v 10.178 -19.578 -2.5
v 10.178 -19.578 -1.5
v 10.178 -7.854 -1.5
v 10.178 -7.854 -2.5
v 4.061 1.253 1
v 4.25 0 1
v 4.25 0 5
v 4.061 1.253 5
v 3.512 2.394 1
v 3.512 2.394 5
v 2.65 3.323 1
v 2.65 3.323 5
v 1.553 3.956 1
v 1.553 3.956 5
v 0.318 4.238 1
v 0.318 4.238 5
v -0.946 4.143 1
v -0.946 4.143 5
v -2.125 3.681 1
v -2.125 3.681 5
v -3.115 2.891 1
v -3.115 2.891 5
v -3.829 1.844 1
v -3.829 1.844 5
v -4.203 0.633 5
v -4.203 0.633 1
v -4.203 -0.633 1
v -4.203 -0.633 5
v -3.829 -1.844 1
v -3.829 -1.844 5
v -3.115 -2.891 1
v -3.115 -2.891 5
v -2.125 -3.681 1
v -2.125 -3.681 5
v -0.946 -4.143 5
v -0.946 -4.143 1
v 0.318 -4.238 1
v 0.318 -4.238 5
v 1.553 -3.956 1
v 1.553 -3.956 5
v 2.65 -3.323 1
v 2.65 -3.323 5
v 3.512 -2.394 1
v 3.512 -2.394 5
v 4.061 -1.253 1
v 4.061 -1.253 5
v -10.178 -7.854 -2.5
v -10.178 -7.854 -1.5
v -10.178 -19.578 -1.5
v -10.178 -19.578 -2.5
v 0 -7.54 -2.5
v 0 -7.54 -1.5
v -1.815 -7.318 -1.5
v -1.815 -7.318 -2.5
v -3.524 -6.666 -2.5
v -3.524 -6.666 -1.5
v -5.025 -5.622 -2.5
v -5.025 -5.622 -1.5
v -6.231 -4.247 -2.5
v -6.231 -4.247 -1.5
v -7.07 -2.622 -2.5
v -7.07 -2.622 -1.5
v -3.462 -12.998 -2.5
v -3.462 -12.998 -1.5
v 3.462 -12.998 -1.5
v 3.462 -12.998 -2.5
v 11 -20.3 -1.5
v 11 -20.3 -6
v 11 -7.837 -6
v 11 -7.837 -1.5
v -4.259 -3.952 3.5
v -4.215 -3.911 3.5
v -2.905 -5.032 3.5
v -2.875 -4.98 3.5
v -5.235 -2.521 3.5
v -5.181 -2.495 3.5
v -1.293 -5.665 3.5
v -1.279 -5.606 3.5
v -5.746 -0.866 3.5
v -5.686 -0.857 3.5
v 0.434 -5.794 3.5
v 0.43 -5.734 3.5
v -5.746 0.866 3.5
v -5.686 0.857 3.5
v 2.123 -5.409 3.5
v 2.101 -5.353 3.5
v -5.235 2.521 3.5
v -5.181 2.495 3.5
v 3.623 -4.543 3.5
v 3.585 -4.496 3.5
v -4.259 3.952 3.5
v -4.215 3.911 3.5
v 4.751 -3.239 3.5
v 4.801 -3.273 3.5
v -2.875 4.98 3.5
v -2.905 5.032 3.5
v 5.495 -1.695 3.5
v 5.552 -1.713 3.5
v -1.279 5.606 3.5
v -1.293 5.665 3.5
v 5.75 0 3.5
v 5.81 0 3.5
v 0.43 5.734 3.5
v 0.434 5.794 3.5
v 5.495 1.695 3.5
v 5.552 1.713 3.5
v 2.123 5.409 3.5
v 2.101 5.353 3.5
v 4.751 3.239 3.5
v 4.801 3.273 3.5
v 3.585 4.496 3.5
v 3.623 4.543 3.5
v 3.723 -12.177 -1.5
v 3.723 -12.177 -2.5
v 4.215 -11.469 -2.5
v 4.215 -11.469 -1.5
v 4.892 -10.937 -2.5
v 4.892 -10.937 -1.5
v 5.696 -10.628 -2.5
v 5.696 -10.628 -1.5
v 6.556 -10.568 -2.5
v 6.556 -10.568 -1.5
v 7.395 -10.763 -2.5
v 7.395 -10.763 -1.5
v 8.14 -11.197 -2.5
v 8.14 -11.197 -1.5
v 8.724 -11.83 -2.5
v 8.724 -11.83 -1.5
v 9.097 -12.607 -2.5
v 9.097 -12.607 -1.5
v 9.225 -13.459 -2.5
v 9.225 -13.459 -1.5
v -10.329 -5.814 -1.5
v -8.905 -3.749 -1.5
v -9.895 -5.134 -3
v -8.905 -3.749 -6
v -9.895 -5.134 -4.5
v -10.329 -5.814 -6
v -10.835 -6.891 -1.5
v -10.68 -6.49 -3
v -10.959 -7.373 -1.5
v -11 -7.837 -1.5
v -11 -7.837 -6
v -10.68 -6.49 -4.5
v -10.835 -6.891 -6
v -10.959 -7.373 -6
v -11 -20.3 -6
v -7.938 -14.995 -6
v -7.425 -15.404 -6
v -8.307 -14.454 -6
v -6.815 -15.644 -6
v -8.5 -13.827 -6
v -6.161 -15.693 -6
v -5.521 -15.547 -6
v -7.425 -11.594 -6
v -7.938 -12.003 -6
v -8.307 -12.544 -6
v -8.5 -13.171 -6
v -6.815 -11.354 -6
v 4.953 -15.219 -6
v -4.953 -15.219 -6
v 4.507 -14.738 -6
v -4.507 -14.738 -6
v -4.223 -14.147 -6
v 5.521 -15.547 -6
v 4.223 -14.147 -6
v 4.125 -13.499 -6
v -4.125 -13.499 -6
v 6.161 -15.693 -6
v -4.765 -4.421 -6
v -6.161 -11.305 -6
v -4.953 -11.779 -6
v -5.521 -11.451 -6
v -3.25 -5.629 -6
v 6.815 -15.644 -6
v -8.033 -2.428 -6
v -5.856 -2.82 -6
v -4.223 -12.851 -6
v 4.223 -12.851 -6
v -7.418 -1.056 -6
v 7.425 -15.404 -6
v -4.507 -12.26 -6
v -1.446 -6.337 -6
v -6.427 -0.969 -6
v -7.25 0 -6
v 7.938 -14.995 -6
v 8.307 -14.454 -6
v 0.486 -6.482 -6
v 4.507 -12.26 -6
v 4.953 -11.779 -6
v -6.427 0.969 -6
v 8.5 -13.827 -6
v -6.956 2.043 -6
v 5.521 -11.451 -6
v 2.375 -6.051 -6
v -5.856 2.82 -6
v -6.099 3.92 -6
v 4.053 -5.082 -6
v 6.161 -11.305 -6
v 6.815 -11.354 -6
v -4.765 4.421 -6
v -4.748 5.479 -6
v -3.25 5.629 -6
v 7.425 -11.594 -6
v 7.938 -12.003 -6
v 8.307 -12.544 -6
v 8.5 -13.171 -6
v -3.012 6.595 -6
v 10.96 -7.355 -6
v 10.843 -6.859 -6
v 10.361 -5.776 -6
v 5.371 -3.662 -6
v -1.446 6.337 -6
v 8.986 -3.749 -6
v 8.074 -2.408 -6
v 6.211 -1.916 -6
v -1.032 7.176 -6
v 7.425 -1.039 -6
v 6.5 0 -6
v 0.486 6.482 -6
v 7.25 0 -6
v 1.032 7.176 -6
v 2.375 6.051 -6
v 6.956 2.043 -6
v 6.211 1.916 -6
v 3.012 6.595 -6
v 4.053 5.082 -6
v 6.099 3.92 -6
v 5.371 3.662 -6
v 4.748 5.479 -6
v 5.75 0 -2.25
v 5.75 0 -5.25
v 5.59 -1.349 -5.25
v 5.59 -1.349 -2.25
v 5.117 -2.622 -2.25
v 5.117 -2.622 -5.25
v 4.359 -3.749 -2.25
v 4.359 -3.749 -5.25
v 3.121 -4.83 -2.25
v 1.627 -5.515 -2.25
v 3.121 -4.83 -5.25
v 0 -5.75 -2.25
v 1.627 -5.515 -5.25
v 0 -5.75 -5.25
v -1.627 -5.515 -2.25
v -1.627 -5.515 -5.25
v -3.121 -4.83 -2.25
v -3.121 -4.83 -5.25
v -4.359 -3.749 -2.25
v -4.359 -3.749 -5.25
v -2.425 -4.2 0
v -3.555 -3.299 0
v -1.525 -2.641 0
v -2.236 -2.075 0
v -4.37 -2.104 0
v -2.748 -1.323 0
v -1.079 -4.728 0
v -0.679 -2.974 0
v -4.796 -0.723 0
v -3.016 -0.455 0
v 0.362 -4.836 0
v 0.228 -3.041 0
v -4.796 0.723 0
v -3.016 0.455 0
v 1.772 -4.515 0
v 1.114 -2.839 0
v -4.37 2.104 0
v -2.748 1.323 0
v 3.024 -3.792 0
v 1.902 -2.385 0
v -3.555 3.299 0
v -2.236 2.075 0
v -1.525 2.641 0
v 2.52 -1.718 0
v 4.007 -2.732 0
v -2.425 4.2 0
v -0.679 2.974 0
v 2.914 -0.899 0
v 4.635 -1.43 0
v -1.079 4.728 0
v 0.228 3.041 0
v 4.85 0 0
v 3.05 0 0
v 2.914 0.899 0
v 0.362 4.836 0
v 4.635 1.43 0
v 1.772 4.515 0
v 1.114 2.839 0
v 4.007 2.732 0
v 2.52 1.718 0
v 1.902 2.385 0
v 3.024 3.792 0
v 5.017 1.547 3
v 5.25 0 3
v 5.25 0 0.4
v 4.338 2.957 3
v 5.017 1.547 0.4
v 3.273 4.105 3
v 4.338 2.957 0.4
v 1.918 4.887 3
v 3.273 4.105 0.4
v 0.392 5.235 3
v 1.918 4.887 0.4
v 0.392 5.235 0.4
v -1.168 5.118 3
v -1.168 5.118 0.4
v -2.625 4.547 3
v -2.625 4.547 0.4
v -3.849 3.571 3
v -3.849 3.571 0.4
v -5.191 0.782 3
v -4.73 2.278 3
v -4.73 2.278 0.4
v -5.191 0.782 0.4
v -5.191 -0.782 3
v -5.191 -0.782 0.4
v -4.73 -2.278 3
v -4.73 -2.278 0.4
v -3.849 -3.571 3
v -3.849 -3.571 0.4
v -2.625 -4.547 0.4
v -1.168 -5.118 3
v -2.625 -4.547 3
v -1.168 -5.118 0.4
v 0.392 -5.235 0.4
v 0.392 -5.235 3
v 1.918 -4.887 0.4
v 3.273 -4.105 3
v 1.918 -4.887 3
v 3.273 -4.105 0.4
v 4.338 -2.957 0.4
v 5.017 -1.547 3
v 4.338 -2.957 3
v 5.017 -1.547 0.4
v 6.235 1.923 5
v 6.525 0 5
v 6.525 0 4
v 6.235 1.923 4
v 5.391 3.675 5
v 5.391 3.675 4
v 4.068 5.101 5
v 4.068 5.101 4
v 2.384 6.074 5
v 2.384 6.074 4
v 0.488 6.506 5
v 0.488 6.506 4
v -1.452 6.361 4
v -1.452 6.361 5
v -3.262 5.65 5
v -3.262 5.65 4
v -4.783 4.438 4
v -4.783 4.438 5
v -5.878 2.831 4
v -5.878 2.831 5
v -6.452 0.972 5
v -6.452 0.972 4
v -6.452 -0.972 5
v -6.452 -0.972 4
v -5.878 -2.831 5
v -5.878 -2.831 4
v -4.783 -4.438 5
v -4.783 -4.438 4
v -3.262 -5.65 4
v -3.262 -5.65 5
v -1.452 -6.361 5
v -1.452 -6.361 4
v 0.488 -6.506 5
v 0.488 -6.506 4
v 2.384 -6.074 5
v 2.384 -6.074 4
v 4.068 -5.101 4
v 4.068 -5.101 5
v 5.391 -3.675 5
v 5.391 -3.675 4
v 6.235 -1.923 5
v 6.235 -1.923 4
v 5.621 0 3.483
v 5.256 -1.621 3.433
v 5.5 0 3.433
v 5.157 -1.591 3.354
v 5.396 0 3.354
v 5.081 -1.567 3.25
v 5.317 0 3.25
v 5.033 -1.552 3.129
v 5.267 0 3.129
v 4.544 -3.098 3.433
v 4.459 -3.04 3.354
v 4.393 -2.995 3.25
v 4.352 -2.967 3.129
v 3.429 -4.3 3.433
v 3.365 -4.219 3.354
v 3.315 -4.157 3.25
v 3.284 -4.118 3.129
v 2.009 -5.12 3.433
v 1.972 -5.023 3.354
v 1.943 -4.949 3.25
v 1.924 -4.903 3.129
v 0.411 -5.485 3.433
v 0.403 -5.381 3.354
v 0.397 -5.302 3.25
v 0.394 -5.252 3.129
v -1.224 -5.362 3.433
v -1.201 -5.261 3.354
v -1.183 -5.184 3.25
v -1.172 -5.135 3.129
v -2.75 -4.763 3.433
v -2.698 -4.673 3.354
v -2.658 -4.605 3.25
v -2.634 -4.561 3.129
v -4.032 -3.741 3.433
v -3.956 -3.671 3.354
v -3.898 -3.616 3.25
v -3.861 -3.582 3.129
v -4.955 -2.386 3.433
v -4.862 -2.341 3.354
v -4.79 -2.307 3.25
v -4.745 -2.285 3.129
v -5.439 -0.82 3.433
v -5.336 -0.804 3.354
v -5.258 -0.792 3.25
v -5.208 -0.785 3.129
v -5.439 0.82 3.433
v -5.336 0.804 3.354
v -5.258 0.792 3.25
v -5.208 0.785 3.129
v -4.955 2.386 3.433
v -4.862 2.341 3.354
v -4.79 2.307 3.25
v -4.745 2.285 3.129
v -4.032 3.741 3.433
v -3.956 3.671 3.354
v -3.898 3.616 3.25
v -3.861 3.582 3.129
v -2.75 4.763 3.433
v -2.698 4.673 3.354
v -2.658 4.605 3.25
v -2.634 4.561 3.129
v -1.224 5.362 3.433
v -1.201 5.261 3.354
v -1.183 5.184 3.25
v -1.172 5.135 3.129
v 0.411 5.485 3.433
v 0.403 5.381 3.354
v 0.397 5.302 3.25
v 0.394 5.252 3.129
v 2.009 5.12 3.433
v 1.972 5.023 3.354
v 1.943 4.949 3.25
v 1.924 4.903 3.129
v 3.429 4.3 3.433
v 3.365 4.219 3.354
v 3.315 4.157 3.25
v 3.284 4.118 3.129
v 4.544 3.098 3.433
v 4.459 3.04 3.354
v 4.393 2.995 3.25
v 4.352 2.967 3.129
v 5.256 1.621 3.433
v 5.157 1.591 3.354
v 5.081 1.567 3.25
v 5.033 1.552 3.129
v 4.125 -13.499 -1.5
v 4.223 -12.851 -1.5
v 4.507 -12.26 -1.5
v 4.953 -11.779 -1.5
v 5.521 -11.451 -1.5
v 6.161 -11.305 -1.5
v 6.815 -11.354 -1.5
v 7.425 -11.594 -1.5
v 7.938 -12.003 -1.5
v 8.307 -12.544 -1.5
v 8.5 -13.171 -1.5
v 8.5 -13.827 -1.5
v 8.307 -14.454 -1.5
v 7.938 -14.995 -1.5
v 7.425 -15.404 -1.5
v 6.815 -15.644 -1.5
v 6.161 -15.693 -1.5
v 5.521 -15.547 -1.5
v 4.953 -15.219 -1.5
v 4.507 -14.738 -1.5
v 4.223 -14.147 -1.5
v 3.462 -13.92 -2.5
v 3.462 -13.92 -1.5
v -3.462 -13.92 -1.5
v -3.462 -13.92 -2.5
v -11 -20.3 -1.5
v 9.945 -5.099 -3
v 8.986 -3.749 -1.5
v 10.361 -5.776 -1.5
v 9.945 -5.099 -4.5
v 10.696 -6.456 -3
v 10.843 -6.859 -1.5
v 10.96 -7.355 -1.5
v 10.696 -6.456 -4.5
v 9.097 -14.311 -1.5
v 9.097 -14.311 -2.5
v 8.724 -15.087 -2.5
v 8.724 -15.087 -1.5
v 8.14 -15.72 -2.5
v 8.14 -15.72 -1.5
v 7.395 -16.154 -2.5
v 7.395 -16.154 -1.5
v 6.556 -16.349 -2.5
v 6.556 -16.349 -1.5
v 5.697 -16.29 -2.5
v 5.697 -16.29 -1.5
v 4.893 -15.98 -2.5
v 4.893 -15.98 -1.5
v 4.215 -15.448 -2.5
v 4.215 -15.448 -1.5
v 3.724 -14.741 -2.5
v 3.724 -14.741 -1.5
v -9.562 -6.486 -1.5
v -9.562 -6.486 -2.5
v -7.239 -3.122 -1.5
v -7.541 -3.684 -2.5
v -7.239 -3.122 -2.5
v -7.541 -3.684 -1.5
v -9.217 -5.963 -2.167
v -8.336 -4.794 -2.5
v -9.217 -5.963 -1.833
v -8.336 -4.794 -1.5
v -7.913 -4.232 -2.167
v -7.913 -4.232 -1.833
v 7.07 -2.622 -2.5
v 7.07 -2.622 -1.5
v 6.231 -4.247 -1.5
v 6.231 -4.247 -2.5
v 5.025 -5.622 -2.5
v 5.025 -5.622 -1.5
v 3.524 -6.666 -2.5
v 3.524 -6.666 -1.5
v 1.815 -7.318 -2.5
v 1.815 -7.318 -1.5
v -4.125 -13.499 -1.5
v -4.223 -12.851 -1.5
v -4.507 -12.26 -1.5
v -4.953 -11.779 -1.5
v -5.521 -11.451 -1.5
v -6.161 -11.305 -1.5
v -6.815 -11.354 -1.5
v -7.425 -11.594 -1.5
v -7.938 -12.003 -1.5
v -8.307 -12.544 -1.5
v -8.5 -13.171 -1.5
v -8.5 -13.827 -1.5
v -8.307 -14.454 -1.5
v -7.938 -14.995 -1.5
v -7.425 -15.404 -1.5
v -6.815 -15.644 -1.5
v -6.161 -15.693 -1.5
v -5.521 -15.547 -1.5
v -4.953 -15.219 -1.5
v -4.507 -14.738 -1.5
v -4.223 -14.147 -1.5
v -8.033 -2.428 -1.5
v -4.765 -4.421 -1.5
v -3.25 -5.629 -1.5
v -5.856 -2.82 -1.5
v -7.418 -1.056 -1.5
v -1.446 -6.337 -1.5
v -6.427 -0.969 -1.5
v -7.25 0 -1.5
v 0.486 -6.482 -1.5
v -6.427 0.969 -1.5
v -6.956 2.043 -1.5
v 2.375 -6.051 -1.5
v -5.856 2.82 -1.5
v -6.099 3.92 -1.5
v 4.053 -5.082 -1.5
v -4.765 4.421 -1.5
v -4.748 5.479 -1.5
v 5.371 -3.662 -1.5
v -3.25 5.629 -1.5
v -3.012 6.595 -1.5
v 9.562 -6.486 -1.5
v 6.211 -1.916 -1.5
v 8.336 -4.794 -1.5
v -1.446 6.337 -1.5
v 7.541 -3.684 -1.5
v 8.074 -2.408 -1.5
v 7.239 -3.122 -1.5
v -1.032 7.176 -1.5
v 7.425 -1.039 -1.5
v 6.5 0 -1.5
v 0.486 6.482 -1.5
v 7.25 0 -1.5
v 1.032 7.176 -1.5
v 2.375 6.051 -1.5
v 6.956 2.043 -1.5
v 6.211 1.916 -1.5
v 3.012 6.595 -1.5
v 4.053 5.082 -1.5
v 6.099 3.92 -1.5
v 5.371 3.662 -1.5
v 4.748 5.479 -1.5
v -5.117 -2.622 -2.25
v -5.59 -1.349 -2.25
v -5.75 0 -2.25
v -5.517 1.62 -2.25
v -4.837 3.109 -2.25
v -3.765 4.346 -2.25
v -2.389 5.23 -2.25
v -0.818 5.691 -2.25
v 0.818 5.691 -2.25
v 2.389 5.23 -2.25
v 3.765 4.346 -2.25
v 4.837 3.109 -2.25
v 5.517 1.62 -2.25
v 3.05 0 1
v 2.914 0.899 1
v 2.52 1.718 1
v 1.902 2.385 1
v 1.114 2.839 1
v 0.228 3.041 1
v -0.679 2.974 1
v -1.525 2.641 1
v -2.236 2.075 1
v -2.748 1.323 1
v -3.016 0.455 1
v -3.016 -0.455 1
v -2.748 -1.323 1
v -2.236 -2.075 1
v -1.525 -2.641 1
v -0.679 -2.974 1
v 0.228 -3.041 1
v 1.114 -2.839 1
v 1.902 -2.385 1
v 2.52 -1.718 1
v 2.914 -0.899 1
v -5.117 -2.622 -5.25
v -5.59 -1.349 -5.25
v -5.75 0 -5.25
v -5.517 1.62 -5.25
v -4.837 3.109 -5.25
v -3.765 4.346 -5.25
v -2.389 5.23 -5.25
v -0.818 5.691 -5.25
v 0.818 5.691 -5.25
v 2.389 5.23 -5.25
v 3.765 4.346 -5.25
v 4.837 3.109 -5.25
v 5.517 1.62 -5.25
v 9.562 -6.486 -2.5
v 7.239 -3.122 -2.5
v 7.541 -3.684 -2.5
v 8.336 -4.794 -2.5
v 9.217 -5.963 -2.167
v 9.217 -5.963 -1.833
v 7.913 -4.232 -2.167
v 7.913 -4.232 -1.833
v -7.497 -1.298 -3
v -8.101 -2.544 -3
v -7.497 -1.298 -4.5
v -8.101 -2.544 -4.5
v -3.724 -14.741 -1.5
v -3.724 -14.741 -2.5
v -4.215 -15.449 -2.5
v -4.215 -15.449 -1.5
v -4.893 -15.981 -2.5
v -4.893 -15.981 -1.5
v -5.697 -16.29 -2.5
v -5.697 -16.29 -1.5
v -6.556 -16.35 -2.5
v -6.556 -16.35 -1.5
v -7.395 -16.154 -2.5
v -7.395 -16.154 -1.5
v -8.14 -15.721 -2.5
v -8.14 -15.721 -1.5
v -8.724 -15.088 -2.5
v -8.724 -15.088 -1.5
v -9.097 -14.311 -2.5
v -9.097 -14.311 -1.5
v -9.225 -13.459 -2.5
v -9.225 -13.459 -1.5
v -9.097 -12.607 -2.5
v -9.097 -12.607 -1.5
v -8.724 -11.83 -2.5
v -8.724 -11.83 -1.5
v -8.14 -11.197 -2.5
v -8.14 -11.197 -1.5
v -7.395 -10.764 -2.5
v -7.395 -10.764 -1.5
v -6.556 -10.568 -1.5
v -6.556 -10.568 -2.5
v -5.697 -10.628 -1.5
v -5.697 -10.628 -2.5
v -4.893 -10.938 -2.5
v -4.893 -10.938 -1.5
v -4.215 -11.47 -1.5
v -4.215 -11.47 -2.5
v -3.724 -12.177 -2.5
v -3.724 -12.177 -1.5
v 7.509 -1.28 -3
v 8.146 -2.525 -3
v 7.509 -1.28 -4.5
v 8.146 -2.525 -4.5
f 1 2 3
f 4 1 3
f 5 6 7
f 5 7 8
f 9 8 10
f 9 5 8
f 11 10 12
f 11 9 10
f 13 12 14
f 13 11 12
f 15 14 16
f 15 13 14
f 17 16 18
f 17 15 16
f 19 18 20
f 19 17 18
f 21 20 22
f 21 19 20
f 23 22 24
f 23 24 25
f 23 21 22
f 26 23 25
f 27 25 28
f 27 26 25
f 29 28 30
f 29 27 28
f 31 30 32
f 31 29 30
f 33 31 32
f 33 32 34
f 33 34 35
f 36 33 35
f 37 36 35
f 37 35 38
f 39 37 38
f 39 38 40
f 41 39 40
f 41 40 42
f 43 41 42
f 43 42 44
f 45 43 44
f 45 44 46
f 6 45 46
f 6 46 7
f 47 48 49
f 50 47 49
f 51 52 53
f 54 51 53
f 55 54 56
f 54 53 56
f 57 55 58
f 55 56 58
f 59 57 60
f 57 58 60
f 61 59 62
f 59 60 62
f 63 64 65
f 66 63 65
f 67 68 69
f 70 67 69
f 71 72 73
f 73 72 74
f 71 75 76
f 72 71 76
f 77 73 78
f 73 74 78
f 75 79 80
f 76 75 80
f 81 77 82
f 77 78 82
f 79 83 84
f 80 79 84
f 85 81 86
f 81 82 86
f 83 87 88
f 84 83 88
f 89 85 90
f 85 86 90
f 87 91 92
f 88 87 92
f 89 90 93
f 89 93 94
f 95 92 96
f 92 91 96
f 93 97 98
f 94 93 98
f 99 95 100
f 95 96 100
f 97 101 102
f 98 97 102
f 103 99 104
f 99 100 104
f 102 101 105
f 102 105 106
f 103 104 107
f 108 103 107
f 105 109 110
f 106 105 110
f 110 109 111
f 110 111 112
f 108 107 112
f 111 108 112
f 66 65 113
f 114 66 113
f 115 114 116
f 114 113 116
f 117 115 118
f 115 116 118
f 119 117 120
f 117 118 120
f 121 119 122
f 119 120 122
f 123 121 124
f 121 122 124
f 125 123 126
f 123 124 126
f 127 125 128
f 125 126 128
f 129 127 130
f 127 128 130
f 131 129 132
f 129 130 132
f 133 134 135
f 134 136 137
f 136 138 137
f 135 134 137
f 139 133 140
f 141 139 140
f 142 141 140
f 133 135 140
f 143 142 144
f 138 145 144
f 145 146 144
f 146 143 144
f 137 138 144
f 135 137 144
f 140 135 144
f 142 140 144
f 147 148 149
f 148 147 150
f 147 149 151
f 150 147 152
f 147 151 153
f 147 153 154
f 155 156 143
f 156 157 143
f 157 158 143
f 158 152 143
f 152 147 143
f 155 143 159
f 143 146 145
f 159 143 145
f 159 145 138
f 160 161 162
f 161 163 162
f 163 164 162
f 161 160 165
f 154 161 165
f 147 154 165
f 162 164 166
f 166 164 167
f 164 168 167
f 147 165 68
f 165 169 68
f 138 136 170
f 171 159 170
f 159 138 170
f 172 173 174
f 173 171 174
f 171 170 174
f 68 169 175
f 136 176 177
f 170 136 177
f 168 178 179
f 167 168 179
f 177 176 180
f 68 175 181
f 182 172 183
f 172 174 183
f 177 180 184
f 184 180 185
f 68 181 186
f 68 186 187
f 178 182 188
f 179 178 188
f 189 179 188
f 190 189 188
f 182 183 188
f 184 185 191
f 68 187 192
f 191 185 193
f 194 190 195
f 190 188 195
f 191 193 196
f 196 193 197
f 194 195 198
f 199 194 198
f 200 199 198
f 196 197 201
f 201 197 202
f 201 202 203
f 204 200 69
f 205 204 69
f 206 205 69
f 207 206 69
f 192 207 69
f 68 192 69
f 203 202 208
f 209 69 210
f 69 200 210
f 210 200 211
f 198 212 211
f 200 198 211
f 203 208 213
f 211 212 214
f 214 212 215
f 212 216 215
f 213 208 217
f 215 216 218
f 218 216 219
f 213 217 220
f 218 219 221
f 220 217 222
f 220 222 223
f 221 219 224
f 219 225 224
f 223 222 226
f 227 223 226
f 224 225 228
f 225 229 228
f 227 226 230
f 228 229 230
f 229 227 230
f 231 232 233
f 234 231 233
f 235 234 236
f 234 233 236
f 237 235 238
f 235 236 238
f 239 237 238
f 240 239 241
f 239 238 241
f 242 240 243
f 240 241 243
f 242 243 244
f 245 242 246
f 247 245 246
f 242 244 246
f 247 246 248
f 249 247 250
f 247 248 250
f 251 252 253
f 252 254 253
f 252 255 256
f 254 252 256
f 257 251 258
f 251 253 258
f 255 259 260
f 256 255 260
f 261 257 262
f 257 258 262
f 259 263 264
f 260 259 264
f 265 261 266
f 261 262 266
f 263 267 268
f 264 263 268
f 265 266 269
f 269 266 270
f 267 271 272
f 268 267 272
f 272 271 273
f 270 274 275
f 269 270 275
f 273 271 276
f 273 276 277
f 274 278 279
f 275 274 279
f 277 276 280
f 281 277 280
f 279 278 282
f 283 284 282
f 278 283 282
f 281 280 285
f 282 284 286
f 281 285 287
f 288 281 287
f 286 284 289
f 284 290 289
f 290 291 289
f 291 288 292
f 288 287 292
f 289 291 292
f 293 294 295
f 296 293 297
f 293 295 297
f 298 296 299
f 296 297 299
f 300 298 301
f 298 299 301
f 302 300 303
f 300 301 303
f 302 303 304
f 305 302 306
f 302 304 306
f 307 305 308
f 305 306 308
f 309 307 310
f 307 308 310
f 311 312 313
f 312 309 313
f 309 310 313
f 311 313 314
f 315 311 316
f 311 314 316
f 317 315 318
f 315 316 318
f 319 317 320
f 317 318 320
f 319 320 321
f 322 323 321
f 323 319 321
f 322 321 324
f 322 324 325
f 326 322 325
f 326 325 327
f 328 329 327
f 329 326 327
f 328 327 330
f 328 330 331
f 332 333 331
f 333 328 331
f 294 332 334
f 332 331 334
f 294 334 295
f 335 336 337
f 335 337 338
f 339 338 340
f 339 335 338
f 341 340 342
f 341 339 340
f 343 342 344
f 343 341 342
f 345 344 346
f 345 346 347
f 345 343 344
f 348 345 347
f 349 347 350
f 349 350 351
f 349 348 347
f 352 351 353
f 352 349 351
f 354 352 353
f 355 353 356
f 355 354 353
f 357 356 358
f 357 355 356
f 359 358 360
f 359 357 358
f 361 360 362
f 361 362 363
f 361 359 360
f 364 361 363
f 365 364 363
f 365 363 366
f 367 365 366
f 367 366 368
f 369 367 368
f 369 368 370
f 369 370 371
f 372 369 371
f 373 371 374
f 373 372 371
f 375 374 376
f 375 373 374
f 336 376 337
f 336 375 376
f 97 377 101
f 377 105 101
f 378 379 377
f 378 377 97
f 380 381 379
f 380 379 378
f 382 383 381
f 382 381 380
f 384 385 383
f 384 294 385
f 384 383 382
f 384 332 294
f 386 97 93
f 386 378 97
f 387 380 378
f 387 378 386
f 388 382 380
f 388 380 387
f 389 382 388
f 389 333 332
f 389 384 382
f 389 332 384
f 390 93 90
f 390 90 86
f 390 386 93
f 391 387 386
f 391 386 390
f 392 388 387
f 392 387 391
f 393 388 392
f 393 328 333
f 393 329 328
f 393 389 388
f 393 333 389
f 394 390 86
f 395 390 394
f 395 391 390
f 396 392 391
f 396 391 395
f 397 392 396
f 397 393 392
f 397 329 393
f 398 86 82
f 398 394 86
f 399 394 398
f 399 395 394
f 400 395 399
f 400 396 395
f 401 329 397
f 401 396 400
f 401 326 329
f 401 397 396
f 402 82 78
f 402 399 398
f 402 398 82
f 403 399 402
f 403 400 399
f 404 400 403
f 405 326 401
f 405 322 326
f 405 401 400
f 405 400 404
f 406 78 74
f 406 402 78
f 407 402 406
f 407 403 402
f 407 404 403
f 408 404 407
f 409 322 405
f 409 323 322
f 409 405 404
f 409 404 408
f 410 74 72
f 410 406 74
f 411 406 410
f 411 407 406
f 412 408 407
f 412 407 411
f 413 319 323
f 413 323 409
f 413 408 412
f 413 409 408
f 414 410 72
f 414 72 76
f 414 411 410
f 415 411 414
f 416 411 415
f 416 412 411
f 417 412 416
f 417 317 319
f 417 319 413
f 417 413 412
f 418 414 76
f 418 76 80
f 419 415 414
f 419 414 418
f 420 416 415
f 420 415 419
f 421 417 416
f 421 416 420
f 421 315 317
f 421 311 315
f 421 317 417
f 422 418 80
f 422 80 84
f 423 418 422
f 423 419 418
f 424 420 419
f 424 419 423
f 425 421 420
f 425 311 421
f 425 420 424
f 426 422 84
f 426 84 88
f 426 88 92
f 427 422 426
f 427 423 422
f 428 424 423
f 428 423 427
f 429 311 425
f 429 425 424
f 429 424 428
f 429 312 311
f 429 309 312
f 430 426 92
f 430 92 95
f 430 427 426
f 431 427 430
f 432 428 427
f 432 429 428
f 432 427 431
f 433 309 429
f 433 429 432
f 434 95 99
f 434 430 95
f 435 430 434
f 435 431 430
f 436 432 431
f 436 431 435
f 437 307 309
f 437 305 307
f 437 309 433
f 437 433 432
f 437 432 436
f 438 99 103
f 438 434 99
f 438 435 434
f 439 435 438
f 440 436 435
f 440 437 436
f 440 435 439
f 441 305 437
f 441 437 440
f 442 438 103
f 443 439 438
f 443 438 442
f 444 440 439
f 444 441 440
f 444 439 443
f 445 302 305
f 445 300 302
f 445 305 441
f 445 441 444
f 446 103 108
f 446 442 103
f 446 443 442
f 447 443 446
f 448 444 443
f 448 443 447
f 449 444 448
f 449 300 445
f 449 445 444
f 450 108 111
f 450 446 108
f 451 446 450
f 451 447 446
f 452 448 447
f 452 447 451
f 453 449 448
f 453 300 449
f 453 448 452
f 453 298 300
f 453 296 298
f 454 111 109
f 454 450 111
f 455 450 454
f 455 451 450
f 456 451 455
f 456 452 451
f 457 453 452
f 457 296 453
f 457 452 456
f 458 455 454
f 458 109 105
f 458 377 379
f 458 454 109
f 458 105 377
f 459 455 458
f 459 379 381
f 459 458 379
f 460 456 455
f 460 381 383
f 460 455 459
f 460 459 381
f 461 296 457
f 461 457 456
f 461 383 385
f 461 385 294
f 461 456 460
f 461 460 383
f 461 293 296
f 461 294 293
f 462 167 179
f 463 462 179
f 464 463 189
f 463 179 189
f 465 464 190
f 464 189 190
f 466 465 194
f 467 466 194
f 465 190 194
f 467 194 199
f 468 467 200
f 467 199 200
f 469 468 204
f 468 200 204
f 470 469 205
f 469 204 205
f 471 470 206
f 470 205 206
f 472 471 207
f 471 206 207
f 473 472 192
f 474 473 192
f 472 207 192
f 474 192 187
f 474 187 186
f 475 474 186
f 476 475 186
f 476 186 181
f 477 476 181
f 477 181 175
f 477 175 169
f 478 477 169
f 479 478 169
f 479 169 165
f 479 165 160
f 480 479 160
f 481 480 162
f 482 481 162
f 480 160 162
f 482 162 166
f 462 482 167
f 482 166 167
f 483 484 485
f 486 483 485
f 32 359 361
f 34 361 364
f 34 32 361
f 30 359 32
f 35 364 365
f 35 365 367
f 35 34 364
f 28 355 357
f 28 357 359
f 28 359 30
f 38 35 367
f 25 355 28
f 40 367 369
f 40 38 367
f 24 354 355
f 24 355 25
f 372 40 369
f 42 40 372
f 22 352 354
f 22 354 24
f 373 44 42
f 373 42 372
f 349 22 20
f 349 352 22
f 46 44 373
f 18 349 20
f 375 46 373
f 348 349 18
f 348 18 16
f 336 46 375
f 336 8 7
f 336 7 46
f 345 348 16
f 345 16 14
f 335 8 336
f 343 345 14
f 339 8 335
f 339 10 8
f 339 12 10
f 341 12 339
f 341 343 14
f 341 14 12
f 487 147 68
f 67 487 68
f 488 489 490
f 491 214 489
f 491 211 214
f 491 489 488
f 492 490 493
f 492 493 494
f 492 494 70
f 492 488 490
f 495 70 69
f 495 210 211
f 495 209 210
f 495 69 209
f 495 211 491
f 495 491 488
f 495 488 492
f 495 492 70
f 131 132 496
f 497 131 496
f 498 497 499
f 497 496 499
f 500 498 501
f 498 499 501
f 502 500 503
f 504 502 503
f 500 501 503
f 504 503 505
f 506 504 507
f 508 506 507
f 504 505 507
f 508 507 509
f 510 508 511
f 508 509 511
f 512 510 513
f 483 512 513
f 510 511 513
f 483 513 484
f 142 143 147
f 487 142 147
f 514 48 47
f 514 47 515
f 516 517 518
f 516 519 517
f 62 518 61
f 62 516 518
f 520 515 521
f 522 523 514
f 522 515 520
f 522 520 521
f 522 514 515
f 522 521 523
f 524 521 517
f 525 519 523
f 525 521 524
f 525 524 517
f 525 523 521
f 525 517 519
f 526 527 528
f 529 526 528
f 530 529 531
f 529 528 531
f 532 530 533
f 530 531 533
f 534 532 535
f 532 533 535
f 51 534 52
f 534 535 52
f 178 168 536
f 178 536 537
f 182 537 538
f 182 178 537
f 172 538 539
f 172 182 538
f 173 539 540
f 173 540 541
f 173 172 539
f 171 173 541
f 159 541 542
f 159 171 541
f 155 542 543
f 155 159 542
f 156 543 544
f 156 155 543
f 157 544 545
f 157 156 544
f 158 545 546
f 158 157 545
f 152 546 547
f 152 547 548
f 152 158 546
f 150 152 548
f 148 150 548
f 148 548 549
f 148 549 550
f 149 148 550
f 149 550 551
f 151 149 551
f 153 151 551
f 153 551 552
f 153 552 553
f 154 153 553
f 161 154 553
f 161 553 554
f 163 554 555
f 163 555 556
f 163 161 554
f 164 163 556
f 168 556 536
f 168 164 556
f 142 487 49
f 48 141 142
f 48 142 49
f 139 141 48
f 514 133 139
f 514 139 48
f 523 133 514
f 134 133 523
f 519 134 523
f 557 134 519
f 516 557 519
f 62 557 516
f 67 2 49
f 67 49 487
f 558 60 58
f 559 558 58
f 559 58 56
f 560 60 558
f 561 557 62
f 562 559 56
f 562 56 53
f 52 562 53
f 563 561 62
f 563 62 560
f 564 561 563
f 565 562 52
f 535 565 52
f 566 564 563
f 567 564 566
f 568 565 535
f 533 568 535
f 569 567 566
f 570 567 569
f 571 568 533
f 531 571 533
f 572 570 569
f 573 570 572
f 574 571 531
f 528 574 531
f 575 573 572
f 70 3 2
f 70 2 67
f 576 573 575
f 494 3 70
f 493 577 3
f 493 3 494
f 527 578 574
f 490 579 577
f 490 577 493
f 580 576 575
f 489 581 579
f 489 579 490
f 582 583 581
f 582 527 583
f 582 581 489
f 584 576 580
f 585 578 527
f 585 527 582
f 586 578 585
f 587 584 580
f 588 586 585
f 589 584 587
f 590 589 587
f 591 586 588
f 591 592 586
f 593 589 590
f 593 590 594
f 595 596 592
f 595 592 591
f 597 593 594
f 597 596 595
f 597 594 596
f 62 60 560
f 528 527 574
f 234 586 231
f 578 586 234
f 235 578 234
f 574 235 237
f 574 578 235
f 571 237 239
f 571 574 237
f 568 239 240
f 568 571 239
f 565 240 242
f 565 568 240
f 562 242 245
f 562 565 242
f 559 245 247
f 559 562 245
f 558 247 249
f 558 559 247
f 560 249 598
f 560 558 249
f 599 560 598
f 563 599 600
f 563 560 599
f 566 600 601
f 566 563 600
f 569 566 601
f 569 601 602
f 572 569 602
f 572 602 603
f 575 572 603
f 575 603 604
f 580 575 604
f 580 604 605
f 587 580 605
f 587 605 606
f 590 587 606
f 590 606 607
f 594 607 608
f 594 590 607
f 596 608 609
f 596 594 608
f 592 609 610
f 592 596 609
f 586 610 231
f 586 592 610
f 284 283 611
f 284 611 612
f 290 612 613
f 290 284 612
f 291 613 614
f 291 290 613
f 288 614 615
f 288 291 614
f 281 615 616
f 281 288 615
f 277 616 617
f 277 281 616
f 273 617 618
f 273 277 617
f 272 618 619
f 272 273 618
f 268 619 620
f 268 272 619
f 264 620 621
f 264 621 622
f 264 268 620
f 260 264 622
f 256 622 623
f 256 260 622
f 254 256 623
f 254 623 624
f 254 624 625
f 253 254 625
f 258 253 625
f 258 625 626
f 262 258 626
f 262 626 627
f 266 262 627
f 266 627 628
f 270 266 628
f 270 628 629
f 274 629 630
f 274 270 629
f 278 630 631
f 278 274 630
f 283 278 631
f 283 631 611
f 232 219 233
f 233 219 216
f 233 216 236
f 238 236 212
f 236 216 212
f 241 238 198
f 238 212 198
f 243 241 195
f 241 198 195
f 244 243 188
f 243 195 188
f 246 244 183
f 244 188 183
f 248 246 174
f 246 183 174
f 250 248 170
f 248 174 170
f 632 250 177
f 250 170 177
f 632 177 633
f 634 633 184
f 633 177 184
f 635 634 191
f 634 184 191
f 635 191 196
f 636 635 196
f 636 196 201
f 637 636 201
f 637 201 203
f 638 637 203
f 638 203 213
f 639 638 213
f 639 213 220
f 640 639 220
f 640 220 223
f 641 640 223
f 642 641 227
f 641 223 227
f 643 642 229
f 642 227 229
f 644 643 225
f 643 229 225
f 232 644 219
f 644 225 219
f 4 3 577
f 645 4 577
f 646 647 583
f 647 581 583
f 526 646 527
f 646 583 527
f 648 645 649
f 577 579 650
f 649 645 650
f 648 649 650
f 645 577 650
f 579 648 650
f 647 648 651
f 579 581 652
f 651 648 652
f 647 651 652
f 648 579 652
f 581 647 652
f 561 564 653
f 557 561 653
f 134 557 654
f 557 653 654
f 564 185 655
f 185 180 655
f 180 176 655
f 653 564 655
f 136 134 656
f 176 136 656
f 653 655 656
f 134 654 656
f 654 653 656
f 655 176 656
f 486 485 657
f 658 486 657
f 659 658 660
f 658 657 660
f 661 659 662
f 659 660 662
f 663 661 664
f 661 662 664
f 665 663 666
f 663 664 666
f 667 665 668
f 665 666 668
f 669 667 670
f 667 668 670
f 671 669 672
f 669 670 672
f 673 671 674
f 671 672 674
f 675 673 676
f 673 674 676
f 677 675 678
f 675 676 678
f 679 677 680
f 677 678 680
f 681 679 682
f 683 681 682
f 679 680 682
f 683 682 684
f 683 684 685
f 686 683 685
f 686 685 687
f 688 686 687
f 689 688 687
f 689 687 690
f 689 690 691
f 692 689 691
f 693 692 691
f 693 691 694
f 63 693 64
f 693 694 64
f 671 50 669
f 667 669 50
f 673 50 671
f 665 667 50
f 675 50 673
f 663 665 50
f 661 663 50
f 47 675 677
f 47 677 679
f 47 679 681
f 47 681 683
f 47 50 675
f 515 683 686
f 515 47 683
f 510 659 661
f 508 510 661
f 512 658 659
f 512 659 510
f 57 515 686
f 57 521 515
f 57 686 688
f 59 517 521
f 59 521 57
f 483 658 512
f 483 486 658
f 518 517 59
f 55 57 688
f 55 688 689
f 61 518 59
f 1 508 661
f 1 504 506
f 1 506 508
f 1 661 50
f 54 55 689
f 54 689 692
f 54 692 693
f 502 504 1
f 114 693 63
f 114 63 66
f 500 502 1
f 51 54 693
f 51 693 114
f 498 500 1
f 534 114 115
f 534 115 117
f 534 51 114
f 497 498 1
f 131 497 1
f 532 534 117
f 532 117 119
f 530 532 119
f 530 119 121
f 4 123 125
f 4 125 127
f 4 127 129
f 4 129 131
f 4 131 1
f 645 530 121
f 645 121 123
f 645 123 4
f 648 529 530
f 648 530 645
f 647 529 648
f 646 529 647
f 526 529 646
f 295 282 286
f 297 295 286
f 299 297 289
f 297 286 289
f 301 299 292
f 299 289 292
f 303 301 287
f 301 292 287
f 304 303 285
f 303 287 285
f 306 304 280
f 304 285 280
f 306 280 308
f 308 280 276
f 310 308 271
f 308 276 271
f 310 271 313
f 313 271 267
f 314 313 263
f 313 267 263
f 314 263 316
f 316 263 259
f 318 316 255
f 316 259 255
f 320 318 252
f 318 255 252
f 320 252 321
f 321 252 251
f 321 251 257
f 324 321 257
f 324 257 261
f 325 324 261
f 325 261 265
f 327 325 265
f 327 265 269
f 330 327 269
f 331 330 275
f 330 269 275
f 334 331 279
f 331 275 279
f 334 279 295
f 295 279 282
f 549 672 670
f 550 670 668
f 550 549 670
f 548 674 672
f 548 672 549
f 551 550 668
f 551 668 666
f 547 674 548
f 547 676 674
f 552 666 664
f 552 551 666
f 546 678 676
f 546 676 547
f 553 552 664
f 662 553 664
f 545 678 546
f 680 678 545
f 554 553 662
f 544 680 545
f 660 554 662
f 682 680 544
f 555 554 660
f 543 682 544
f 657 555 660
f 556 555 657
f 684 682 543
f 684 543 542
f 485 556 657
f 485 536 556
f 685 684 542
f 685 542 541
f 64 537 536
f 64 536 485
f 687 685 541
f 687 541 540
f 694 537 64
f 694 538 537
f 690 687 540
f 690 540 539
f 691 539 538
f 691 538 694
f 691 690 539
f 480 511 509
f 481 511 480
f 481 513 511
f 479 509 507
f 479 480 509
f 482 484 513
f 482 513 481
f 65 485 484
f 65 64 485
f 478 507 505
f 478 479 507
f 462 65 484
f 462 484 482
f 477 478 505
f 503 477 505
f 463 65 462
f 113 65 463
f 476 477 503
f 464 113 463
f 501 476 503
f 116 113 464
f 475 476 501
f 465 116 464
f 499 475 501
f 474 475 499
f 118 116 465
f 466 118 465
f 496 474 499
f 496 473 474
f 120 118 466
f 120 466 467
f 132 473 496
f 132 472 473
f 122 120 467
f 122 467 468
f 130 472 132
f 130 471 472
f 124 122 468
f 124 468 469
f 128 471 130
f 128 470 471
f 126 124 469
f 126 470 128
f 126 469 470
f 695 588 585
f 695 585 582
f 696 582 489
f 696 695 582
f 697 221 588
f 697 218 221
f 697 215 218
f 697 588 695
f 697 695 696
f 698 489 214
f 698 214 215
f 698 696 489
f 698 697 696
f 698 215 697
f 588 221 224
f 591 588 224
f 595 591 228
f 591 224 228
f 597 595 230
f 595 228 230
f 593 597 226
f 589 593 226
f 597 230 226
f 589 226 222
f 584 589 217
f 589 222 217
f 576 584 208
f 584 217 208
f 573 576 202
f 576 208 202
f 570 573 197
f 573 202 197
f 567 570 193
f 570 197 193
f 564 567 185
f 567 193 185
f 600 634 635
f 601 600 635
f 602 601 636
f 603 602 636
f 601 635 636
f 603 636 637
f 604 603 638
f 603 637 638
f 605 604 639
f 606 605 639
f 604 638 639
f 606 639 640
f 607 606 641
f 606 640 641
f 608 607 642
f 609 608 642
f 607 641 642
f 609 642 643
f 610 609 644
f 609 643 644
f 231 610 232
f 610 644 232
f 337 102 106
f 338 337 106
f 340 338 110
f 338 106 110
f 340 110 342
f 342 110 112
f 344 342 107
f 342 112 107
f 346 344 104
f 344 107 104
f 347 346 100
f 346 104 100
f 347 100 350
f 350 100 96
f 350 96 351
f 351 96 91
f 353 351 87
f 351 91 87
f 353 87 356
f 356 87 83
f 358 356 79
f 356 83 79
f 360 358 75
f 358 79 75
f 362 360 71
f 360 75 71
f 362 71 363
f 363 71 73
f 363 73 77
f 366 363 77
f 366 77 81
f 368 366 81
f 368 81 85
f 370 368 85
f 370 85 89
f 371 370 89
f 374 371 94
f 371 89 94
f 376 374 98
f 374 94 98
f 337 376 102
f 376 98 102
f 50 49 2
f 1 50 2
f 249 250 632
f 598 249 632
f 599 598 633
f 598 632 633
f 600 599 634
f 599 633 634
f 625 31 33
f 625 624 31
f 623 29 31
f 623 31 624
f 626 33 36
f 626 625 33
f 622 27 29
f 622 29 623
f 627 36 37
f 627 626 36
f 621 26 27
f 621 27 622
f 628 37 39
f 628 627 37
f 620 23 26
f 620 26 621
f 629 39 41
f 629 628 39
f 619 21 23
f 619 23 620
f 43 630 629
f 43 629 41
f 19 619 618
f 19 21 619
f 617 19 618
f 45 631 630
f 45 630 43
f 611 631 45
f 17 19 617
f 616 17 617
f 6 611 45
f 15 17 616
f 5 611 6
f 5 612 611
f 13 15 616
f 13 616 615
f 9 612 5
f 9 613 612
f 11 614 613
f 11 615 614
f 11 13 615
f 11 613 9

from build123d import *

# Parameters (mm, degrees)
F0_R      = 4.25
F0_R_2    = 3.05
F1_DEPTH  = 1
F0_R_3    = 5.25
F2_DEPTH  = 5
F3_SIZE   = 0.4
F5_R      = 6.5245521105
F5_R_2    = 4.8436348364
F6_DEPTH  = 1.5
F7_R      = 0.5
F8_SIZE2  = 0.7140740034
F8_SIZE   = 0.5
F10_R     = 2.2
F11_DEPTH = 4.5
F15_DEPTH = 1


# Not quite as in the source:
# - a fillet or chamfer that OpenCascade refuses, or shapes differently, is made with other operations: its cross-section is extruded or revolved along the edge and cut away or added


with BuildPart() as f1:
    # F0 (on Top) → F1 (new body)
    with BuildSketch(Plane.XY):
        Circle(F0_R)
        Circle(F0_R_2, mode=Mode.SUBTRACT)
    extrude(amount=F1_DEPTH)

    # F0 (on Top) → F2 (join)
    with BuildSketch(Plane.XY):
        Circle(F0_R_3)
        Circle(F0_R, mode=Mode.SUBTRACT)
    extrude(amount=F2_DEPTH)

    # F3
    f3_edges = [f1.edges().sort_by_distance(p)[0] for p in [
        (-5.25, 0, 0),
    ]]
    chamfer(f3_edges, length=F3_SIZE)

    # F5 (on offset) → F6 (join)
    with BuildSketch(Plane.XY.offset(5)):
        Circle(F5_R)
        Circle(F5_R_2, mode=Mode.SUBTRACT)
    extrude(amount=-F6_DEPTH)

    # F7
    f7_edges = [f1.edges().sort_by_distance(p)[0] for p in [
        (-5.25, 0, 3.5),
    ]]
    fillet(f7_edges, radius=F7_R)

    # F8
    f8_edges = [f1.edges().sort_by_distance(p)[0] for p in [
        (-6.524552, 0, 3.5),
    ]]
    f8_side = f1.faces().sort_by_distance((-6.524552, 0, 4.25))[0]
    chamfer(f8_edges, length=F8_SIZE, length2=F8_SIZE2, reference=f8_side)


with BuildPart() as f11:
    # F10 (on offset) → F11 (new body)
    with BuildSketch(Plane.XY.offset(-6)):
        with BuildLine():
            ThreePointArc((-5.75, 0), (0, 5.75), (5.75, 0))
            Line((5.75, 0), (7.25, 0))
            ThreePointArc((7.25, 0), (0, 7.25), (-7.25, 0))
            Line((-7.25, 0), (-5.75, 0))
        make_face()
        with BuildLine():
            ThreePointArc((-4.3594842183, -3.749319585), (-5.3911749302, -1.9994331378), (-5.75, 0))
            Line((-5.75, 0), (-7.25, 0))
            ThreePointArc((-7.25, 0), (-6.9839296942, -1.9460796559), (-6.2052479926, -3.749319585))
            Line((-6.2052479926, -3.749319585), (-4.3594842183, -3.749319585))
        make_face()
        with BuildLine():
            Line((6.2052479926, -3.749319585), (4.3594842183, -3.749319585))
            ThreePointArc((4.3594842183, -3.749319585), (0, -5.75), (-4.3594842183, -3.749319585))
            Line((-4.3594842183, -3.749319585), (-6.2052479926, -3.749319585))
            ThreePointArc((-6.2052479926, -3.749319585), (0, -7.25), (6.2052479926, -3.749319585))
        make_face()
        with BuildLine():
            Line((7.25, 0), (5.75, 0))
            ThreePointArc((5.75, 0), (5.3911749302, -1.9994331378), (4.3594842183, -3.749319585))
            Line((4.3594842183, -3.749319585), (6.2052479926, -3.749319585))
            ThreePointArc((6.2052479926, -3.749319585), (6.9839296942, -1.9460796559), (7.25, 0))
        make_face()
        with BuildLine():
            ThreePointArc((-6.2052479926, -3.749319585), (-6.9839296942, -1.9460796559), (-7.25, 0))
            add(Edge.make_bspline(
                [(-7.25, 0), (-7.2656506928, -1.3271520952), (-8.0546621033, -2.5618388367), (-8.9048569039, -3.749319585)],
                knots=[0, 0, 0, 0, 3.981709245, 3.981709245, 3.981709245, 3.981709245], degree=3))
            Line((-8.9048569039, -3.749319585), (-6.2052479926, -3.749319585))
        make_face()
        with BuildLine():
            Line((8.9863599272, -3.749319585), (6.2052479926, -3.749319585))
            ThreePointArc((6.2052479926, -3.749319585), (0, -7.25), (-6.2052479926, -3.749319585))
            Line((-6.2052479926, -3.749319585), (-8.9048569039, -3.749319585))
            add(Edge.make_bspline(
                [(-8.9048569039, -3.749319585), (-9.9096958288, -5.1527942681), (-11, -6.4903283123), (-11, -7.8366426751)],
                knots=[3.981709245, 3.981709245, 3.981709245, 3.981709245, 8.6876618498, 8.6876618498, 8.6876618498, 8.6876618498], degree=3))
            Line((-11, -7.8366426751), (11, -7.8366426751))
            add(Edge.make_bspline(
                [(8.9863599272, -3.749319585), (9.9677269971, -5.1019814592), (11, -6.4384359832), (11, -7.8366426751)],
                knots=[4.1157167981, 4.1157167981, 4.1157167981, 4.1157167981, 8.6876618498, 8.6876618498, 8.6876618498, 8.6876618498], degree=3))
        make_face()
        with BuildLine():
            add(Edge.make_bspline(
                [(7.25, 0), (7.2607375636, -1.3008223386), (8.1029221586, -2.5316380218), (8.9863599272, -3.749319585)],
                knots=[0, 0, 0, 0, 4.1157167981, 4.1157167981, 4.1157167981, 4.1157167981], degree=3))
            ThreePointArc((7.25, 0), (6.9839296942, -1.9460796559), (6.2052479926, -3.749319585))
            Line((6.2052479926, -3.749319585), (8.9863599272, -3.749319585))
        make_face()
        Polygon((11, -20.3), (11, -7.8366426751), (-11, -7.8366426751), (-11, -20.3), (0, -20.3), align=None)
        with Locations((-6.325, -13.4990205988)):
            Circle(F10_R, mode=Mode.SUBTRACT)
        with BuildLine():
            ThreePointArc((8.525, -13.4990205988), (6.325, -15.6990205988), (4.125, -13.4990205988))
            ThreePointArc((4.125, -13.4990205988), (6.325, -11.2990205988), (8.525, -13.4990205988))
        make_face(mode=Mode.SUBTRACT)
    extrude(amount=F11_DEPTH)

    # F12: chamfer of 0.75 on 2 edges, made by hand

    # F12_s1 → F12_t2 (revolve, cut)
    with BuildSketch(Plane.XZ):
        Polygon((5.75, -2.25), (6.5, -1.5), (5.75, -1.5), align=None)
    revolve(axis=Axis((0, 0, -1.5), (0, 0, -1)), mode=Mode.SUBTRACT)

    # F12_s3 → F12_t4 (revolve, cut)
    with BuildSketch(Plane.XZ):
        Polygon((5.75, -5.25), (6.5, -6), (5.75, -6), align=None)
    revolve(axis=Axis((0, 0, -6), (0, 0, -1)), mode=Mode.SUBTRACT)

    # F14 (on offset) → F15 (cut)
    with BuildSketch(Plane.XY.offset(-1.5)):
        with BuildLine():
            ThreePointArc((0, -7.5402029312), (-4.3061145714, -6.1896718444), (-7.0696866821, -2.6218677427))
            add(Edge.make_bspline(
                [(-10.1782370821, -7.8539925324), (-9.6560776489, -5.8711635466), (-7.4144124978, -4.1833631916), (-7.0696866821, -2.6218677427)],
                knots=[0, 0, 0, 0, 6.0859030065, 6.0859030065, 6.0859030065, 6.0859030065], degree=3))
            Line((-10.1782370821, -7.8539925324), (-10.1782370821, -19.5775783759))
            Line((-10.1782370821, -19.5775783759), (0, -19.5775783759))
            Line((0, -19.5775783759), (0, -13.9200452533))
            Line((0, -13.9200452533), (-3.4618476619, -13.9200452533))
            ThreePointArc((-3.4618476619, -13.9200452533), (-9.2249834149, -13.4591182958), (-3.4618476619, -12.9981913384))
            Line((-3.4618476619, -12.9981913384), (0, -12.9981913384))
            Line((0, -12.9981913384), (0, -7.5402029312))
        make_face()
        with BuildLine():
            add(Edge.make_bspline(
                [(10.1782370821, -7.8539925324), (9.6560776489, -5.8711635466), (7.4144124978, -4.1833631916), (7.0696866821, -2.6218677427)],
                knots=[0, 0, 0, 0, 6.0859030065, 6.0859030065, 6.0859030065, 6.0859030065], degree=3))
            ThreePointArc((7.0696866821, -2.6218677427), (4.3061145714, -6.1896718444), (0, -7.5402029312))
            Line((0, -7.5402029312), (0, -12.9981913384))
            Line((0, -12.9981913384), (3.461807566, -12.9981913384))
            ThreePointArc((3.461807566, -12.9981913384), (6.5559861293, -10.5678753889), (9.225016577, -13.4586630092))
            ThreePointArc((9.225016577, -13.4586630092), (6.5564458102, -16.3494138649), (3.4619541562, -13.9200452533))
            Line((3.4619541562, -13.9200452533), (0, -13.9200452533))
            Line((0, -13.9200452533), (0, -19.5775783759))
            Line((0, -19.5775783759), (10.1782370821, -19.5775783759))
            Line((10.1782370821, -19.5775783759), (10.1782370821, -7.8539925324))
        make_face()
    extrude(amount=-F15_DEPTH, mode=Mode.SUBTRACT)


solid = Compound([f1.part, f11.part])
